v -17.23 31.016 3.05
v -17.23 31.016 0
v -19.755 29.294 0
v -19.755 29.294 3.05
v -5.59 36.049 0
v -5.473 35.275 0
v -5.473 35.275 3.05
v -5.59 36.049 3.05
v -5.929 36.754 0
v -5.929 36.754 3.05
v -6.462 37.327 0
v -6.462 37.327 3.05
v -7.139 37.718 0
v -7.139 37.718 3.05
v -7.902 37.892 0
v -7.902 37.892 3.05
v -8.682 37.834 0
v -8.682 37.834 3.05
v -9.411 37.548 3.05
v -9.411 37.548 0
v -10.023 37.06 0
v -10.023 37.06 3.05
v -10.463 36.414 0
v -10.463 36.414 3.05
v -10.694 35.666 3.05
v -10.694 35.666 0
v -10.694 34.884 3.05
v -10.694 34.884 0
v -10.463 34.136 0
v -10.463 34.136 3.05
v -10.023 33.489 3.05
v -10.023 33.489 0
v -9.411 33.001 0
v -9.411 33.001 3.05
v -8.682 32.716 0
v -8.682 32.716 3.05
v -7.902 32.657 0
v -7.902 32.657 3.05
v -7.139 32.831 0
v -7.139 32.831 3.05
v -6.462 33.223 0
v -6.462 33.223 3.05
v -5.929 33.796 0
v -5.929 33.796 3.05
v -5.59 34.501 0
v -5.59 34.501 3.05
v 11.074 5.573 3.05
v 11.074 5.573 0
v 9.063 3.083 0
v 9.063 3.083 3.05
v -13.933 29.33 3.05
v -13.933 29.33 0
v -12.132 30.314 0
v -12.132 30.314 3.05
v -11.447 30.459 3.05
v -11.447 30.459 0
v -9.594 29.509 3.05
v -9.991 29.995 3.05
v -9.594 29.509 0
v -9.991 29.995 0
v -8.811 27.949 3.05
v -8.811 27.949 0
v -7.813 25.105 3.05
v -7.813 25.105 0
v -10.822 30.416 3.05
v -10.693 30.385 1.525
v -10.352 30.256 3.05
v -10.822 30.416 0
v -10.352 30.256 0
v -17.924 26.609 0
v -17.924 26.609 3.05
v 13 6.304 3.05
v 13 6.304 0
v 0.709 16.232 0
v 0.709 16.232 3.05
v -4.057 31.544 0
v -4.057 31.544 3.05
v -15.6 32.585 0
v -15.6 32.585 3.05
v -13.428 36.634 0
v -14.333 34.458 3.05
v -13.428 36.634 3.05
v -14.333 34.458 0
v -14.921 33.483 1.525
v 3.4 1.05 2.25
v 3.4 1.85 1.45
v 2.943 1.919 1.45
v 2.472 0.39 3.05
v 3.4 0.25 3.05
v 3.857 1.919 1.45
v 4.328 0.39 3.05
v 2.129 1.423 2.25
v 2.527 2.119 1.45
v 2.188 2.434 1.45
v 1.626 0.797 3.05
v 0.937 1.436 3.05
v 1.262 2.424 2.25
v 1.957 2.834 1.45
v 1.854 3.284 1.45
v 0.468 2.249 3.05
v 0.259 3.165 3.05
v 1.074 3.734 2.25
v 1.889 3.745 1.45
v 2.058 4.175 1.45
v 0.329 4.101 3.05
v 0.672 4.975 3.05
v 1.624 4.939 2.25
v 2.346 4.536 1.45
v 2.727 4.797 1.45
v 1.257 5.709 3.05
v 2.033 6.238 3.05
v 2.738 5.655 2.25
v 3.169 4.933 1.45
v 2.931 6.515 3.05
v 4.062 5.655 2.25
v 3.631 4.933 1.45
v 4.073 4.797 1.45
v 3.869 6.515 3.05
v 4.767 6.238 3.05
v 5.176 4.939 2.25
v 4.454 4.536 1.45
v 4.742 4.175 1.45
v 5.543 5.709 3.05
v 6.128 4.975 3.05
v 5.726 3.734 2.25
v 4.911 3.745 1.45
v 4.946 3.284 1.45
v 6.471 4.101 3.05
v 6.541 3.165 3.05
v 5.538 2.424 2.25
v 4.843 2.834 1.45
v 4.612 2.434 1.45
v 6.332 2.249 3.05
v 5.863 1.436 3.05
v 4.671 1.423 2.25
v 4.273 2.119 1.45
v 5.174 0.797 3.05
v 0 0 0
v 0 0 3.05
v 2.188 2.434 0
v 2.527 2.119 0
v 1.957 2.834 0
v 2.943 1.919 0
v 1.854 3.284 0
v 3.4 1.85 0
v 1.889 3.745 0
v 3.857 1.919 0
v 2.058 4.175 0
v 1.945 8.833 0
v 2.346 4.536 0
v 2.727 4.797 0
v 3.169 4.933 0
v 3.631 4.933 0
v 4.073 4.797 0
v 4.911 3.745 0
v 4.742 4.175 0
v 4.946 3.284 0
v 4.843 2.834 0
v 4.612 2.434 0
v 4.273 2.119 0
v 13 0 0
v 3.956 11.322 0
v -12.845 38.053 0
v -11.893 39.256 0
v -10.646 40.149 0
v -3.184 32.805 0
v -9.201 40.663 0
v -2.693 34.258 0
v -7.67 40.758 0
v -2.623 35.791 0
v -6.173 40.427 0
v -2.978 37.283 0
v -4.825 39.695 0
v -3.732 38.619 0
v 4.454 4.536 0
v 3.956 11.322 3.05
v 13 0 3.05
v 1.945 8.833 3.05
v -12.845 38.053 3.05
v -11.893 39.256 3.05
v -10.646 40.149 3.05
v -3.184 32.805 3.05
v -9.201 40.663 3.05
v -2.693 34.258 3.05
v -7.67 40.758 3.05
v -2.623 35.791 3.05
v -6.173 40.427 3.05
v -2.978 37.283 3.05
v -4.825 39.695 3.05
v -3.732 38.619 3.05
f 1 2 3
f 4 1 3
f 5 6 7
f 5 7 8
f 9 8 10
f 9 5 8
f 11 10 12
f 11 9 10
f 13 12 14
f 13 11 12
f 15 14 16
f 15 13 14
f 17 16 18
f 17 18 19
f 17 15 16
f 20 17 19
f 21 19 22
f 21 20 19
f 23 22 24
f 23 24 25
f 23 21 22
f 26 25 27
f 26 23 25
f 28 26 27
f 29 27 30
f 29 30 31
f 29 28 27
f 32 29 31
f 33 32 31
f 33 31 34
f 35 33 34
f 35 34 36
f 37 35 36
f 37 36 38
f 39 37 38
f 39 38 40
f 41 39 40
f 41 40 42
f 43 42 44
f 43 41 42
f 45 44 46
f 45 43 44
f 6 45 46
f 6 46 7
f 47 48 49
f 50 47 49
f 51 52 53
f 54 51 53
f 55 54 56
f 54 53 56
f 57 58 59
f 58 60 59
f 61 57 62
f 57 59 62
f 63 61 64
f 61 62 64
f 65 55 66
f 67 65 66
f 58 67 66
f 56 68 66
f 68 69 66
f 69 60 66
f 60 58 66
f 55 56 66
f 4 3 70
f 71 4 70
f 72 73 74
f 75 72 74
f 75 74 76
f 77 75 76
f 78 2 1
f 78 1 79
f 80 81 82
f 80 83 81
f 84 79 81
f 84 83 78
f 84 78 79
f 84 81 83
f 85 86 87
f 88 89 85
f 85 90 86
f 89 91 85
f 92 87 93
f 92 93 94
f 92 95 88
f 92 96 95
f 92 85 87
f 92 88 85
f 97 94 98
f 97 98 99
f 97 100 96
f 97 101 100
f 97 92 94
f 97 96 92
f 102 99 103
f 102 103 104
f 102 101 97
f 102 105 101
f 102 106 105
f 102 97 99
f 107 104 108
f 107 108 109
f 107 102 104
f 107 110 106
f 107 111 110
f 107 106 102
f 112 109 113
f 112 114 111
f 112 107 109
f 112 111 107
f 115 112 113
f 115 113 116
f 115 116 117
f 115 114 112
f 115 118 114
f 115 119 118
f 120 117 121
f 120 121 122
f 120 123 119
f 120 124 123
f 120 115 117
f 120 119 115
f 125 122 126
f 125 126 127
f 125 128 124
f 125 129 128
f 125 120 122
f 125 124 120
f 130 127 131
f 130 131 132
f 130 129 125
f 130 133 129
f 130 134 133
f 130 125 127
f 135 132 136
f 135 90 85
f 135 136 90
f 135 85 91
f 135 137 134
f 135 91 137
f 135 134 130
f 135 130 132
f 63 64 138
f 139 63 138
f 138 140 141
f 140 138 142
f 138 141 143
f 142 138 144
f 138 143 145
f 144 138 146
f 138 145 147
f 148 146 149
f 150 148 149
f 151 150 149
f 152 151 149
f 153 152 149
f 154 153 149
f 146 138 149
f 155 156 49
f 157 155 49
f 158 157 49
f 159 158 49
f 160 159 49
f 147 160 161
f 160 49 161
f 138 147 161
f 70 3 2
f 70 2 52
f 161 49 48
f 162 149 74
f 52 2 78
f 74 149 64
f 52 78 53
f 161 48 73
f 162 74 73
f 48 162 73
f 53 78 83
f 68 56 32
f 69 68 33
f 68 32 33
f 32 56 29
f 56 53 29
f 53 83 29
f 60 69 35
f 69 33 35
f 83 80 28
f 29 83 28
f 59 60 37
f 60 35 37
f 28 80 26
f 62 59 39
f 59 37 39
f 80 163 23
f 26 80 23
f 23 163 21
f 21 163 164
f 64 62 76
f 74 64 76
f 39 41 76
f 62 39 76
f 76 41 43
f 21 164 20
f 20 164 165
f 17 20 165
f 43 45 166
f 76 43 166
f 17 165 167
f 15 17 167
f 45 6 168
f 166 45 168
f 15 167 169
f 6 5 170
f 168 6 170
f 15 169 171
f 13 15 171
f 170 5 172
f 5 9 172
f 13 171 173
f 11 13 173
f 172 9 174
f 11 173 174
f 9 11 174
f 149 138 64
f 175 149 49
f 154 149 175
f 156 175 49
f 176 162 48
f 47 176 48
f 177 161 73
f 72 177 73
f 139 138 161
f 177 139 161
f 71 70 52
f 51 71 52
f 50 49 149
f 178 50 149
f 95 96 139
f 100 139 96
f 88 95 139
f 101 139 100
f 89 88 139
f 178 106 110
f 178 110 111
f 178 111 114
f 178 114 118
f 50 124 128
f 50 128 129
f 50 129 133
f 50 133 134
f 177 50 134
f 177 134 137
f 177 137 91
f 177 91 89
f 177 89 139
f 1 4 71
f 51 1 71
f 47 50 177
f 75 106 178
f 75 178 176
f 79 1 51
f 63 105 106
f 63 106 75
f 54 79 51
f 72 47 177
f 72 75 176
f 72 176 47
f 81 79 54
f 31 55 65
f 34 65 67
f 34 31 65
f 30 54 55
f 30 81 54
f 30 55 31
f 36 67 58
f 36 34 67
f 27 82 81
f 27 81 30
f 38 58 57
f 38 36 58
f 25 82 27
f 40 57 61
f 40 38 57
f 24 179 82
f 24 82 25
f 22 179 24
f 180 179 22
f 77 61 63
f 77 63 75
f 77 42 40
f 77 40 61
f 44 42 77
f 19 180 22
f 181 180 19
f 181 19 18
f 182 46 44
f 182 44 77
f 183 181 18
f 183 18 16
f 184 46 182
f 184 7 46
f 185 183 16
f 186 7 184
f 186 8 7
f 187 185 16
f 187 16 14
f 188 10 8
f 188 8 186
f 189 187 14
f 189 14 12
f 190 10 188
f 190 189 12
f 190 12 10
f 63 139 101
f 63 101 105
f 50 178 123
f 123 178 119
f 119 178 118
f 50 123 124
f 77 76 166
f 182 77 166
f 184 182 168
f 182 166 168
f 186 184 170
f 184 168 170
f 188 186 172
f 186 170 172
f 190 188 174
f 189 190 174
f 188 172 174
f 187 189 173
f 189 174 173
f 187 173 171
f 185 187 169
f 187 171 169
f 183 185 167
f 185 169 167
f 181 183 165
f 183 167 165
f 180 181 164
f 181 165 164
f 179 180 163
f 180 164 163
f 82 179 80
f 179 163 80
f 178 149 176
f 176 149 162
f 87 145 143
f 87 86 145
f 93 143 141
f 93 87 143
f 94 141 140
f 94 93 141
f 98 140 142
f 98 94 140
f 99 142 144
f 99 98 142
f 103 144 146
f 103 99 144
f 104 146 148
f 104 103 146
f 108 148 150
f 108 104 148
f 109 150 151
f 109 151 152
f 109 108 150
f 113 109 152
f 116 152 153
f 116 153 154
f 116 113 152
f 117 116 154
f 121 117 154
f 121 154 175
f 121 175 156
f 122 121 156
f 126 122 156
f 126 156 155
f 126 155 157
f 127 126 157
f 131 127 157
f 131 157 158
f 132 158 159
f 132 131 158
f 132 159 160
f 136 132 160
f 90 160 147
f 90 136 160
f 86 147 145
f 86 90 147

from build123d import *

# Parameters (mm, degrees)
SKETCH1_R           = 1.5
SKETCH1_R_2         = 2.625
BOSS_EXTRUDE1_DEPTH = 3.05


with BuildPart() as part:
    # Sketch1 → Boss-Extrude1 (new body)
    with BuildSketch(Plane.XY):
        with BuildLine():
            Line((-7.813226831, 25.104795624), (0, 0))
            Line((0, 0), (13, 0))
            Line((13, 0), (13, 6.303908615))
            Line((13, 6.303908615), (0.708529353, 16.231634907))
            Line((0.708529353, 16.231634907), (-4.057068102, 31.544047144))
            ThreePointArc((-4.057068102, 31.544047144), (-5.473136356, 40.107888765), (-13.427731373, 36.633834833))
            add(Edge.make_bspline(
                [(-17.229515242, 31.01562696), (-14.514237852, 33.142129435), (-13.427731373, 36.633834833)],
                knots=[0, 0, 0, 1, 1, 1], degree=2))
            Line((-17.229515242, 31.01562696), (-19.754600441, 29.293942889))
            Line((-19.754600441, 29.293942889), (-17.9237303, 26.608721385))
            Line((-17.9237303, 26.608721385), (-13.932796466, 29.329868067))
            add(Edge.make_bspline(
                [(-13.932796466, 29.329868067), (-12.381551692, 30.407849096), (-10.691589638, 30.789278346), (-9.223592818, 29.609717336), (-7.813226831, 25.104795624)],
                knots=[0, 0, 0, 0, 0.517103648, 1, 1, 1, 1], degree=3))
        make_face()
        with Locations((3.4, 3.4)):
            Circle(SKETCH1_R, mode=Mode.SUBTRACT)
        Polygon((11.073847559, 5.572751724), (9.110294099, 3.141685535), (9.063168816, 3.083339947), (1.945007017, 8.832624477), (3.95568576, 11.322036253), align=None, mode=Mode.SUBTRACT)
        with Locations((-8.098279353, 35.2748127)):
            Circle(SKETCH1_R_2, mode=Mode.SUBTRACT)
    extrude(amount=BOSS_EXTRUDE1_DEPTH)

    # Sketch3 → CSK for M3 Flat Head Machine Screw1 (revolve, cut)
    with BuildSketch(Plane(origin=(3.4, 3.4, 3.05), x_dir=(0, -1, 0), z_dir=(1, 0, 0))):
        Polygon((0, 0), (0, 3.05), (1.55, 3.05), (1.55, 1.6), (3.15, 0), align=None)
    revolve(axis=Axis((3.4, 3.4, 9.4), (0, 0, -1)), mode=Mode.SUBTRACT)


solid = part.part
